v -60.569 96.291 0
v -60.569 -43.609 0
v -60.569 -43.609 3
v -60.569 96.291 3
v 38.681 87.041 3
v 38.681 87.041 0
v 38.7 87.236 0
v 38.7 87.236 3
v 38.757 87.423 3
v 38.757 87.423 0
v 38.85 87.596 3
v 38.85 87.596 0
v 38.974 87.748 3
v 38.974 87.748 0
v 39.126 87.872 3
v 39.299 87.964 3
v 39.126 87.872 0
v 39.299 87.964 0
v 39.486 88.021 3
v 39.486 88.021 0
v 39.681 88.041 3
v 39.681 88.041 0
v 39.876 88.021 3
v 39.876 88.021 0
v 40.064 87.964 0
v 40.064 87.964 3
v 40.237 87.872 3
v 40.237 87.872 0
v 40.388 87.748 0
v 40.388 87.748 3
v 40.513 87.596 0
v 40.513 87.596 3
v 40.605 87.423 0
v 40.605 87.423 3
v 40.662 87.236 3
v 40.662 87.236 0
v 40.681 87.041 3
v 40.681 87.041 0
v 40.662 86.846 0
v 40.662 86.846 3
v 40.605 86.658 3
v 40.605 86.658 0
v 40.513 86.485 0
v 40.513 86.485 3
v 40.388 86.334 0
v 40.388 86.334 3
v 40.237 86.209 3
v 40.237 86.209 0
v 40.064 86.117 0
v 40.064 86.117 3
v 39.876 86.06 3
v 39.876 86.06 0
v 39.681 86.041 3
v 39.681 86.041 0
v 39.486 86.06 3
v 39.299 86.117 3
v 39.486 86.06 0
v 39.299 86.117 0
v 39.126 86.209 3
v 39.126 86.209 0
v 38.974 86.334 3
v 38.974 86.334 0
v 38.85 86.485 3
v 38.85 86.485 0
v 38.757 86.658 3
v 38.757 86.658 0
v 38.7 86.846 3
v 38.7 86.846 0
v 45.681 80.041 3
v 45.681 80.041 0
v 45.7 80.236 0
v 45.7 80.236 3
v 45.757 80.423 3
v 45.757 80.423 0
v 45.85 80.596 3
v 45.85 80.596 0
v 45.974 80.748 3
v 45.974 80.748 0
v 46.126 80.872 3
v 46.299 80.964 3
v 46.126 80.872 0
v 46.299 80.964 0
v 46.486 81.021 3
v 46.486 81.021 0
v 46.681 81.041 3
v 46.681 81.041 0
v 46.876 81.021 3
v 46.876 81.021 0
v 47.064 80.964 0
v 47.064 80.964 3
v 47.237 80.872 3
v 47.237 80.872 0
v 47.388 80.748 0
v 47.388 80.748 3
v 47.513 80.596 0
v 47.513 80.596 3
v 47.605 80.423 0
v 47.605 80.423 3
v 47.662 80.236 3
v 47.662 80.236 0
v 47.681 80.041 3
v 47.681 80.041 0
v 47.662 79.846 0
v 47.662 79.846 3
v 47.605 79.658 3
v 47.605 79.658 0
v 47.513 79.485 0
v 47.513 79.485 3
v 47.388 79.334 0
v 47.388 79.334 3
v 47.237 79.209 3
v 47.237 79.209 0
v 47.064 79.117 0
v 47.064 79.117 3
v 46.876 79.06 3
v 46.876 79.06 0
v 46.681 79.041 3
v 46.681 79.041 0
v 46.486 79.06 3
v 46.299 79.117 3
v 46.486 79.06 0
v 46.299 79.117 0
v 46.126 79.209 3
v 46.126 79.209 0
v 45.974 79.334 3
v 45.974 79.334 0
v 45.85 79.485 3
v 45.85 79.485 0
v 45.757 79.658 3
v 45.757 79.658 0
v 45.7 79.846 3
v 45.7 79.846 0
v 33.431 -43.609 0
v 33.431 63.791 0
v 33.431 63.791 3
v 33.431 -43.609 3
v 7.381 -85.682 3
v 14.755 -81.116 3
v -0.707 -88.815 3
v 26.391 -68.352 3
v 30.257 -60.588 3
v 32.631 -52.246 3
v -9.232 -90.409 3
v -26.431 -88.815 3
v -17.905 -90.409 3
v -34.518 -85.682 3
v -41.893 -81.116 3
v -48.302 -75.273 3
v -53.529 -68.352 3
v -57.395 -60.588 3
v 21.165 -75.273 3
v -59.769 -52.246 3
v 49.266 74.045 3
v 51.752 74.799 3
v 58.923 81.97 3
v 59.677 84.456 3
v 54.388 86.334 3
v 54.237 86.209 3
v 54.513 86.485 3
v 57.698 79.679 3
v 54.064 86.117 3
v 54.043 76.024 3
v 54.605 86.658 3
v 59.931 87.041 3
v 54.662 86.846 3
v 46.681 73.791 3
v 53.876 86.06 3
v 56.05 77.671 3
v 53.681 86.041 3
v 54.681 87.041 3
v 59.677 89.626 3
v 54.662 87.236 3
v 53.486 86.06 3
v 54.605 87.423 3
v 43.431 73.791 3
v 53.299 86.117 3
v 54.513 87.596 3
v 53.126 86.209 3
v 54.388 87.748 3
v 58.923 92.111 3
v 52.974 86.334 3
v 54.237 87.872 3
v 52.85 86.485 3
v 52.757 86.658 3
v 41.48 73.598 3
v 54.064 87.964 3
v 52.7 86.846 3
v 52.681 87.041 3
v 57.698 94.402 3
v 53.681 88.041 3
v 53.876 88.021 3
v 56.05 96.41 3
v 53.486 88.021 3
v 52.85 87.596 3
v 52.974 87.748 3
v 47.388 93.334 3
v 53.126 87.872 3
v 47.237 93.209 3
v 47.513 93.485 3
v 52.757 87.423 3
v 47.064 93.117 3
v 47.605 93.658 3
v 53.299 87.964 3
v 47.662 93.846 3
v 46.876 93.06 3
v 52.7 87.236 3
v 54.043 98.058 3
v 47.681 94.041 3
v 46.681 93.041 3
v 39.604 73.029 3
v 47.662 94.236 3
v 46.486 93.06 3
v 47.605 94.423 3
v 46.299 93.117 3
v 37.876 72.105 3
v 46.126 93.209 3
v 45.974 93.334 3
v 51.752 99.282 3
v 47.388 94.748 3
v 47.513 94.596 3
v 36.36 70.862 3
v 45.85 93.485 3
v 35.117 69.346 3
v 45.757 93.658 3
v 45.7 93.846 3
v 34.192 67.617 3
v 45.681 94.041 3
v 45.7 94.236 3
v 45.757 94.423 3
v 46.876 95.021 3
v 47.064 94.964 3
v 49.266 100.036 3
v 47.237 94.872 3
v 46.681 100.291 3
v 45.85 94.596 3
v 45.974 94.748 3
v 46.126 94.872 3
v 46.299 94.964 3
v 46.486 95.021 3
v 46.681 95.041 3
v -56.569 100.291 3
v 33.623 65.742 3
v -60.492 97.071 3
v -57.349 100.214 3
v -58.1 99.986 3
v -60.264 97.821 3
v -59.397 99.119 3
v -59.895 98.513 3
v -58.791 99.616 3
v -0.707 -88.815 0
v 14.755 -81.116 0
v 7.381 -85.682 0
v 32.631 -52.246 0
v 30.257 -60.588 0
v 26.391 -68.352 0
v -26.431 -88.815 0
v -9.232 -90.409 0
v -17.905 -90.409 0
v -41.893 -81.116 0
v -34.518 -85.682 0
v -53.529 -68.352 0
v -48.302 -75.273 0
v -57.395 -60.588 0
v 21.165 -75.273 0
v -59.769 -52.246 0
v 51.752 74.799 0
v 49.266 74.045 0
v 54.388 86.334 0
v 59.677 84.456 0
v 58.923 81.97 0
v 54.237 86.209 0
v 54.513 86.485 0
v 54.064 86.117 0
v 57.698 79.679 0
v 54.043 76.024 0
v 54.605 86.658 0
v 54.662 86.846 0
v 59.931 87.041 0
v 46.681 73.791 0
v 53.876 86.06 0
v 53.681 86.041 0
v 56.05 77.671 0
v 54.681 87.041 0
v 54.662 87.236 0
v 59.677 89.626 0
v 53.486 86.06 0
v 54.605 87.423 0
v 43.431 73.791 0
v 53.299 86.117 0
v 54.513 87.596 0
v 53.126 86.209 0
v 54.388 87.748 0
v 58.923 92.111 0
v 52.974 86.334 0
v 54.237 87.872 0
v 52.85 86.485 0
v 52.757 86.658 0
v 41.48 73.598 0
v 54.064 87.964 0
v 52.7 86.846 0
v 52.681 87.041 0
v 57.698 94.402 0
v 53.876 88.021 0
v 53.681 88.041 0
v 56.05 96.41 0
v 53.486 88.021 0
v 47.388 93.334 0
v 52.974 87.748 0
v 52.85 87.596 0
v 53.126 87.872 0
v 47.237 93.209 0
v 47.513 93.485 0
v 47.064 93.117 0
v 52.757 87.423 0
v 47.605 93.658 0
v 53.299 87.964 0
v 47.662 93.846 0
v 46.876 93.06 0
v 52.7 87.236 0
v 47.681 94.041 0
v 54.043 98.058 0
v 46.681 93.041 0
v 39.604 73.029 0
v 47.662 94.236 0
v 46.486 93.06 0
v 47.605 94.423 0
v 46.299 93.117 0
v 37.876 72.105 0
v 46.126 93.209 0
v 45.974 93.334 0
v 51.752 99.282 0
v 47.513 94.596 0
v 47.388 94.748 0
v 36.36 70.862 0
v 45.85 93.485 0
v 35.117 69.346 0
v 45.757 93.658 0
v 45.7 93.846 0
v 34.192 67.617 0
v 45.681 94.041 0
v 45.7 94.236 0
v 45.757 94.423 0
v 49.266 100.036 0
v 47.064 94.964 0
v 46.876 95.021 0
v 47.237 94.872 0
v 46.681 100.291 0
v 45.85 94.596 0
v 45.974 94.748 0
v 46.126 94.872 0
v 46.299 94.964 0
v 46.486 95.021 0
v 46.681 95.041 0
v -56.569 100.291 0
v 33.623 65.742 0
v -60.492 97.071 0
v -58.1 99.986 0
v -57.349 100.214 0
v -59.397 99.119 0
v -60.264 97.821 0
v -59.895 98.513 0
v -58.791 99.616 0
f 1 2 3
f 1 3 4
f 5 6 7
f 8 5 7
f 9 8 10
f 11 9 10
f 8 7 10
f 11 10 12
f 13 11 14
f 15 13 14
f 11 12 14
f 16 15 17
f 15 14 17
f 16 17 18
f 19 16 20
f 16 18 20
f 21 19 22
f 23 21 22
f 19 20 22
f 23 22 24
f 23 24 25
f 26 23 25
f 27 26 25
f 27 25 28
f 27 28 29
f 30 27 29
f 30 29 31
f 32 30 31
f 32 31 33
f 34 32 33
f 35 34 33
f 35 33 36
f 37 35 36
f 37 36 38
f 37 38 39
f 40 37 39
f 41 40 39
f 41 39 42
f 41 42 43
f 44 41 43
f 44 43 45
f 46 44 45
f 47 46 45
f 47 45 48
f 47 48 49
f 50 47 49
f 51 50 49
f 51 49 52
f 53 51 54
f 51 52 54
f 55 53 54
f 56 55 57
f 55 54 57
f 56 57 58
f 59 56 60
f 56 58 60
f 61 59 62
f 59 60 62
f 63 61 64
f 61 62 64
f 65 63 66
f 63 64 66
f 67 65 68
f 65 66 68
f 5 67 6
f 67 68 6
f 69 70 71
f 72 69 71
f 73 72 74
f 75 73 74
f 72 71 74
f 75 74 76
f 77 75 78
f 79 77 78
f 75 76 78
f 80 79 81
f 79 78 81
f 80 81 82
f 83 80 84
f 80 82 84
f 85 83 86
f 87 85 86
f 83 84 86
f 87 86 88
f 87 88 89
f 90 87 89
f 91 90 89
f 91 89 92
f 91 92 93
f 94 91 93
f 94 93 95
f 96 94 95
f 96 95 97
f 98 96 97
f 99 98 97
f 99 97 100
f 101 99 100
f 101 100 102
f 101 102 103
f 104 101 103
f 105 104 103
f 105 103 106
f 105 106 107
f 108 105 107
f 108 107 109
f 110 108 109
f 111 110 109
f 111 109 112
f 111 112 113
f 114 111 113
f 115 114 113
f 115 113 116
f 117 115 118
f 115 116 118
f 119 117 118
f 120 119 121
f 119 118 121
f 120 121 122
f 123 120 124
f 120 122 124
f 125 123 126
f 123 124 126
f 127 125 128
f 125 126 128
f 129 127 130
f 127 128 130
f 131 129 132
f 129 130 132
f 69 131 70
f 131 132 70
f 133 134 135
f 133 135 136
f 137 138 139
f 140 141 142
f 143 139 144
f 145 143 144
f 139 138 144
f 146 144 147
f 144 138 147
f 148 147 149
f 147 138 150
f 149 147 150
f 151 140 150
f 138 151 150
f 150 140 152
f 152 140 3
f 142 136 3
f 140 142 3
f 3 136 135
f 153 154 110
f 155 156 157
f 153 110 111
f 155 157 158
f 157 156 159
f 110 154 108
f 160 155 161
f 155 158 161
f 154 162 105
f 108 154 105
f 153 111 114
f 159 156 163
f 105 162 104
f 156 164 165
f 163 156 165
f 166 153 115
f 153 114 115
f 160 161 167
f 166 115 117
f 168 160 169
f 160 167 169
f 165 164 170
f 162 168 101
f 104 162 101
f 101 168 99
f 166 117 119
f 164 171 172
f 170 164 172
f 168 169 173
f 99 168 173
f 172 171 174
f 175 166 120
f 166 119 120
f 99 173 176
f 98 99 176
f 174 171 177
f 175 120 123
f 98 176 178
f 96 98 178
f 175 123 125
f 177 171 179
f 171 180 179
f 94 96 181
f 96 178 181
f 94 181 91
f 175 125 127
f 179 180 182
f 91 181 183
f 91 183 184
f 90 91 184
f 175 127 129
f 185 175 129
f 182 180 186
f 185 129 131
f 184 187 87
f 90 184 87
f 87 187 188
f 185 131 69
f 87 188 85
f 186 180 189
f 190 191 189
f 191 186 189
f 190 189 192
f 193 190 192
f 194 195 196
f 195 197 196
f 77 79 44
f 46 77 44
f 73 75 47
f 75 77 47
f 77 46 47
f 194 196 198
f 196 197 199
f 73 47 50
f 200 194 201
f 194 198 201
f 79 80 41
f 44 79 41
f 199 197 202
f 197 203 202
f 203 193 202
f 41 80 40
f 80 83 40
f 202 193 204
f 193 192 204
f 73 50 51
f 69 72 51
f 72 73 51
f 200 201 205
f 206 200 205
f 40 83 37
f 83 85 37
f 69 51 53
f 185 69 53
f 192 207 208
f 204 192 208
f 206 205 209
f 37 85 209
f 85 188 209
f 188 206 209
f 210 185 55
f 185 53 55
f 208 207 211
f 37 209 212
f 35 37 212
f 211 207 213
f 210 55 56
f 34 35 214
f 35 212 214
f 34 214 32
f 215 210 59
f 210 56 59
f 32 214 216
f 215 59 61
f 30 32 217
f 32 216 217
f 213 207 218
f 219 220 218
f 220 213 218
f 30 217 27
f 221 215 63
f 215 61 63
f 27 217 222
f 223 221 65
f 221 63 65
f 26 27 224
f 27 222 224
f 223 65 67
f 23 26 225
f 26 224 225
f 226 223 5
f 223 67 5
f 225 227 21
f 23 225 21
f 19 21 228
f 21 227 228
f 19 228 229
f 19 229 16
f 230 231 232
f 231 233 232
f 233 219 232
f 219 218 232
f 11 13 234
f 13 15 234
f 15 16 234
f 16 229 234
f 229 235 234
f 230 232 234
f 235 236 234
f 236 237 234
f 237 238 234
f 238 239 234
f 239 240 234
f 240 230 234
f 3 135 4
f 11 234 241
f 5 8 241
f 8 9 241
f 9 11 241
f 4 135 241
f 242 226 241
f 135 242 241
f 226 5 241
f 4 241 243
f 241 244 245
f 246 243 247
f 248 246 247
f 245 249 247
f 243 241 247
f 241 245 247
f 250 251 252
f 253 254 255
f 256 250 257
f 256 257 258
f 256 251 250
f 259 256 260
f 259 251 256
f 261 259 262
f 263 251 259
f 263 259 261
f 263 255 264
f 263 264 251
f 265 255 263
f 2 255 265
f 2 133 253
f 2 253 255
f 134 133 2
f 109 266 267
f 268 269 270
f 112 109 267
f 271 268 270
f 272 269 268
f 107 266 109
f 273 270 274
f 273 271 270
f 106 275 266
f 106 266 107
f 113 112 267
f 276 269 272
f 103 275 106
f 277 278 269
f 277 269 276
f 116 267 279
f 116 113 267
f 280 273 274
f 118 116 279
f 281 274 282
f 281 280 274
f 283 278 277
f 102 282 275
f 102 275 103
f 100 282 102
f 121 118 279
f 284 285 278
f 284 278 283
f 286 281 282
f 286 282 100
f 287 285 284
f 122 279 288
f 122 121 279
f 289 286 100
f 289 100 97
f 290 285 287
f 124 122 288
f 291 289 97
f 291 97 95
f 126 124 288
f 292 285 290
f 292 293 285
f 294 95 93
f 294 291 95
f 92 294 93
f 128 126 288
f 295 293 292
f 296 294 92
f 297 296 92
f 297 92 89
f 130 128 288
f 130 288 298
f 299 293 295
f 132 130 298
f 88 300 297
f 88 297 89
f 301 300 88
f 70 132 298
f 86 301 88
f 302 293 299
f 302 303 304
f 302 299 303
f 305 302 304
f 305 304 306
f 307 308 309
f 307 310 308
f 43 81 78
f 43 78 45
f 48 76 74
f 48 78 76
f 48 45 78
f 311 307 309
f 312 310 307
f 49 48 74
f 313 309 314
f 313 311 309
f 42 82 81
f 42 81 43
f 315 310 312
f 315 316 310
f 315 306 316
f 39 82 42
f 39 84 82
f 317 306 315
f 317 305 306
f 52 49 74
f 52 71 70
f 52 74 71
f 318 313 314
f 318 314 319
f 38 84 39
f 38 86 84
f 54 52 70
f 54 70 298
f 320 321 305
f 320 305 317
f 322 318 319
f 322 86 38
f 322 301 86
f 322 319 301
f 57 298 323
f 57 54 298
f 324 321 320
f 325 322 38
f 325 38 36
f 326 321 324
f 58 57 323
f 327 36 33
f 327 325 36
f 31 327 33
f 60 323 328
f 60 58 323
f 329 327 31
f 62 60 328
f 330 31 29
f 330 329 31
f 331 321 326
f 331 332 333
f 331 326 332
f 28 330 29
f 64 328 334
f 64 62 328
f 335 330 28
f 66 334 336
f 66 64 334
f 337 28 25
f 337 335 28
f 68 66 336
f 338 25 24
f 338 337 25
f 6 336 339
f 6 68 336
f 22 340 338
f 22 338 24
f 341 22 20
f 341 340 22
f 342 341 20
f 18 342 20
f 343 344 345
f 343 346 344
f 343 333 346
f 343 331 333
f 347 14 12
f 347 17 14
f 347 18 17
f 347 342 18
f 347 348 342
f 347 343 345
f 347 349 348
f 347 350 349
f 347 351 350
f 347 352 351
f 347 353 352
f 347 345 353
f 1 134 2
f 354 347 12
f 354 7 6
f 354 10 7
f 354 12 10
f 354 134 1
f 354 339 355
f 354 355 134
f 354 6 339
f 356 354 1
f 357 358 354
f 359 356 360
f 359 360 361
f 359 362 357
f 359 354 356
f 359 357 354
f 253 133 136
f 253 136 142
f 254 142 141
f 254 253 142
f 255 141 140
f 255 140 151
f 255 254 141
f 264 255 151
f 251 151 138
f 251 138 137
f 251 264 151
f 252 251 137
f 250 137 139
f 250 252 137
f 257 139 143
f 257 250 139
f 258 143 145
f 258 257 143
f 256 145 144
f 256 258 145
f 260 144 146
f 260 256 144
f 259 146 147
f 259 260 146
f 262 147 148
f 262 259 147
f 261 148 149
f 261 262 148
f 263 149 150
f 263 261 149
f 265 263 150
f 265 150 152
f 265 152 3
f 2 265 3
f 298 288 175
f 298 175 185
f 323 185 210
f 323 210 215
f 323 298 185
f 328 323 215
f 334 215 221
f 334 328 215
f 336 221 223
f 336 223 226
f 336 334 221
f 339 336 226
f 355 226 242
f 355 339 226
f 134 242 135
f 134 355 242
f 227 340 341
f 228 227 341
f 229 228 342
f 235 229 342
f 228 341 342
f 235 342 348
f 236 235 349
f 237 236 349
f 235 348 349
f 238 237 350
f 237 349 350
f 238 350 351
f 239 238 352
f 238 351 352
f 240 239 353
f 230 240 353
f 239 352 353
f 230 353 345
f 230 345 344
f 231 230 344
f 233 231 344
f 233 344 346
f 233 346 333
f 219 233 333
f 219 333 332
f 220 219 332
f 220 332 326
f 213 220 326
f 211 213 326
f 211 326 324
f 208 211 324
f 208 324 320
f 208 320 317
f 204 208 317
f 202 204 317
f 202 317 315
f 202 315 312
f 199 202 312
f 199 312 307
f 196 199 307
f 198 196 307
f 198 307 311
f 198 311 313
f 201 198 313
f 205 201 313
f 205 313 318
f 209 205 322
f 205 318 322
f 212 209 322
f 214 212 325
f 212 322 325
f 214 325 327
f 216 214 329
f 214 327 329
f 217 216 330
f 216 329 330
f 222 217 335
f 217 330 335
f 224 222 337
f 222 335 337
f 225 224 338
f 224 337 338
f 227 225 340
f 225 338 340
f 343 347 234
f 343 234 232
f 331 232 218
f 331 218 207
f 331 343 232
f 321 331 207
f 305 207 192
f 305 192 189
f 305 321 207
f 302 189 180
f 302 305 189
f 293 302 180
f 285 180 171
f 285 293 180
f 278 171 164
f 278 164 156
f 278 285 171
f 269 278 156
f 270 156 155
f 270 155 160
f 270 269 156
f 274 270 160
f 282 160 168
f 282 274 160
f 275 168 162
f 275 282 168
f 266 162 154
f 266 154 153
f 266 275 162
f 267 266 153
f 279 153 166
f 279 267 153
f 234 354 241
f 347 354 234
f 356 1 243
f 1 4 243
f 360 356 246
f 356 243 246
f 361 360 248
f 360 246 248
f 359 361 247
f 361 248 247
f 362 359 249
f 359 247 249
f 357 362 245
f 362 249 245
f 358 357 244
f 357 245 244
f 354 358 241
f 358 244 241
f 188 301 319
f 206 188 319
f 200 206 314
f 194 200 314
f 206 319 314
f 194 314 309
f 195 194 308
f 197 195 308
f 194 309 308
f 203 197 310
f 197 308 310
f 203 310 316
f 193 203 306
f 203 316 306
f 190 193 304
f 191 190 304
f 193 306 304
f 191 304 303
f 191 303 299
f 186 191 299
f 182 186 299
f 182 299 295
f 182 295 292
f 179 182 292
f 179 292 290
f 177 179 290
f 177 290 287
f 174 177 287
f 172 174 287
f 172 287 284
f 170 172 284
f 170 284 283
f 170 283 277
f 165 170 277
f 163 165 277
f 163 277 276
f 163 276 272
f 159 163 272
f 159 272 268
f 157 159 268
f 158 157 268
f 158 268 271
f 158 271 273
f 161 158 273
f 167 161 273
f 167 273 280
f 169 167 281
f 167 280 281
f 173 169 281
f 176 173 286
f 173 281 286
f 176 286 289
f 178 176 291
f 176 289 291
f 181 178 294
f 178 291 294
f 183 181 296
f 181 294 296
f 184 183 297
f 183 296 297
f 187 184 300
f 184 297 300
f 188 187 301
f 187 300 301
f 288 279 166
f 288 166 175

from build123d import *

# Parameters (mm, degrees)
EXTRUDE_1_DEPTH     = 3
SKETCH_2_R          = 1
CUT_EXTRUDE_1_DEPTH = 10
FILLET_1_R          = 4


with BuildPart() as part:
    # 草图1 → 凸台-拉伸1 (new body)
    with BuildSketch(Plane.XY):
        with BuildLine():
            Line((-60.568770688, -43.609385344), (-60.568770688, 100.290614656))
            Line((-60.568770688, 100.290614656), (33.431229312, 100.290614656))
            Line((33.431229312, 100.290614656), (46.681229312, 100.290614656))
            ThreePointArc((46.681229312, 100.290614656), (59.931229312, 87.040614656), (46.681229312, 73.790614656))
            Line((46.681229312, 73.790614656), (43.431229312, 73.790614656))
            ThreePointArc((43.431229312, 73.790614656), (36.3601615, 70.861682468), (33.431229312, 63.790614656))
            Line((33.431229312, 63.790614656), (33.431229312, -43.609385344))
            ThreePointArc((33.431229312, -43.609385344), (-13.568770688, -90.609385344), (-60.568770688, -43.609385344))
        make_face()
    extrude(amount=EXTRUDE_1_DEPTH)

    # 草图2 → 切除-拉伸1 (cut)
    with BuildSketch(Plane(origin=(0, 0, 0), x_dir=(-1, 0, 0), z_dir=(0, 0, -1))):
        with Locations((-46.681229312, 94.040614656)):
            Circle(SKETCH_2_R)
        with Locations((-39.681229312, 87.040614656)):
            Circle(SKETCH_2_R)
        with Locations((-46.681229312, 80.040614656)):
            Circle(SKETCH_2_R)
        with Locations((-53.681229312, 87.040614656)):
            Circle(SKETCH_2_R)
    extrude(amount=-CUT_EXTRUDE_1_DEPTH, mode=Mode.SUBTRACT)

    # 圆角1
    fillet_1_edges = [part.edges().sort_by_distance(p)[0] for p in [
        (-60.568770688, 100.290614656, 1.5),
    ]]
    fillet(fillet_1_edges, radius=FILLET_1_R)


solid = part.part
